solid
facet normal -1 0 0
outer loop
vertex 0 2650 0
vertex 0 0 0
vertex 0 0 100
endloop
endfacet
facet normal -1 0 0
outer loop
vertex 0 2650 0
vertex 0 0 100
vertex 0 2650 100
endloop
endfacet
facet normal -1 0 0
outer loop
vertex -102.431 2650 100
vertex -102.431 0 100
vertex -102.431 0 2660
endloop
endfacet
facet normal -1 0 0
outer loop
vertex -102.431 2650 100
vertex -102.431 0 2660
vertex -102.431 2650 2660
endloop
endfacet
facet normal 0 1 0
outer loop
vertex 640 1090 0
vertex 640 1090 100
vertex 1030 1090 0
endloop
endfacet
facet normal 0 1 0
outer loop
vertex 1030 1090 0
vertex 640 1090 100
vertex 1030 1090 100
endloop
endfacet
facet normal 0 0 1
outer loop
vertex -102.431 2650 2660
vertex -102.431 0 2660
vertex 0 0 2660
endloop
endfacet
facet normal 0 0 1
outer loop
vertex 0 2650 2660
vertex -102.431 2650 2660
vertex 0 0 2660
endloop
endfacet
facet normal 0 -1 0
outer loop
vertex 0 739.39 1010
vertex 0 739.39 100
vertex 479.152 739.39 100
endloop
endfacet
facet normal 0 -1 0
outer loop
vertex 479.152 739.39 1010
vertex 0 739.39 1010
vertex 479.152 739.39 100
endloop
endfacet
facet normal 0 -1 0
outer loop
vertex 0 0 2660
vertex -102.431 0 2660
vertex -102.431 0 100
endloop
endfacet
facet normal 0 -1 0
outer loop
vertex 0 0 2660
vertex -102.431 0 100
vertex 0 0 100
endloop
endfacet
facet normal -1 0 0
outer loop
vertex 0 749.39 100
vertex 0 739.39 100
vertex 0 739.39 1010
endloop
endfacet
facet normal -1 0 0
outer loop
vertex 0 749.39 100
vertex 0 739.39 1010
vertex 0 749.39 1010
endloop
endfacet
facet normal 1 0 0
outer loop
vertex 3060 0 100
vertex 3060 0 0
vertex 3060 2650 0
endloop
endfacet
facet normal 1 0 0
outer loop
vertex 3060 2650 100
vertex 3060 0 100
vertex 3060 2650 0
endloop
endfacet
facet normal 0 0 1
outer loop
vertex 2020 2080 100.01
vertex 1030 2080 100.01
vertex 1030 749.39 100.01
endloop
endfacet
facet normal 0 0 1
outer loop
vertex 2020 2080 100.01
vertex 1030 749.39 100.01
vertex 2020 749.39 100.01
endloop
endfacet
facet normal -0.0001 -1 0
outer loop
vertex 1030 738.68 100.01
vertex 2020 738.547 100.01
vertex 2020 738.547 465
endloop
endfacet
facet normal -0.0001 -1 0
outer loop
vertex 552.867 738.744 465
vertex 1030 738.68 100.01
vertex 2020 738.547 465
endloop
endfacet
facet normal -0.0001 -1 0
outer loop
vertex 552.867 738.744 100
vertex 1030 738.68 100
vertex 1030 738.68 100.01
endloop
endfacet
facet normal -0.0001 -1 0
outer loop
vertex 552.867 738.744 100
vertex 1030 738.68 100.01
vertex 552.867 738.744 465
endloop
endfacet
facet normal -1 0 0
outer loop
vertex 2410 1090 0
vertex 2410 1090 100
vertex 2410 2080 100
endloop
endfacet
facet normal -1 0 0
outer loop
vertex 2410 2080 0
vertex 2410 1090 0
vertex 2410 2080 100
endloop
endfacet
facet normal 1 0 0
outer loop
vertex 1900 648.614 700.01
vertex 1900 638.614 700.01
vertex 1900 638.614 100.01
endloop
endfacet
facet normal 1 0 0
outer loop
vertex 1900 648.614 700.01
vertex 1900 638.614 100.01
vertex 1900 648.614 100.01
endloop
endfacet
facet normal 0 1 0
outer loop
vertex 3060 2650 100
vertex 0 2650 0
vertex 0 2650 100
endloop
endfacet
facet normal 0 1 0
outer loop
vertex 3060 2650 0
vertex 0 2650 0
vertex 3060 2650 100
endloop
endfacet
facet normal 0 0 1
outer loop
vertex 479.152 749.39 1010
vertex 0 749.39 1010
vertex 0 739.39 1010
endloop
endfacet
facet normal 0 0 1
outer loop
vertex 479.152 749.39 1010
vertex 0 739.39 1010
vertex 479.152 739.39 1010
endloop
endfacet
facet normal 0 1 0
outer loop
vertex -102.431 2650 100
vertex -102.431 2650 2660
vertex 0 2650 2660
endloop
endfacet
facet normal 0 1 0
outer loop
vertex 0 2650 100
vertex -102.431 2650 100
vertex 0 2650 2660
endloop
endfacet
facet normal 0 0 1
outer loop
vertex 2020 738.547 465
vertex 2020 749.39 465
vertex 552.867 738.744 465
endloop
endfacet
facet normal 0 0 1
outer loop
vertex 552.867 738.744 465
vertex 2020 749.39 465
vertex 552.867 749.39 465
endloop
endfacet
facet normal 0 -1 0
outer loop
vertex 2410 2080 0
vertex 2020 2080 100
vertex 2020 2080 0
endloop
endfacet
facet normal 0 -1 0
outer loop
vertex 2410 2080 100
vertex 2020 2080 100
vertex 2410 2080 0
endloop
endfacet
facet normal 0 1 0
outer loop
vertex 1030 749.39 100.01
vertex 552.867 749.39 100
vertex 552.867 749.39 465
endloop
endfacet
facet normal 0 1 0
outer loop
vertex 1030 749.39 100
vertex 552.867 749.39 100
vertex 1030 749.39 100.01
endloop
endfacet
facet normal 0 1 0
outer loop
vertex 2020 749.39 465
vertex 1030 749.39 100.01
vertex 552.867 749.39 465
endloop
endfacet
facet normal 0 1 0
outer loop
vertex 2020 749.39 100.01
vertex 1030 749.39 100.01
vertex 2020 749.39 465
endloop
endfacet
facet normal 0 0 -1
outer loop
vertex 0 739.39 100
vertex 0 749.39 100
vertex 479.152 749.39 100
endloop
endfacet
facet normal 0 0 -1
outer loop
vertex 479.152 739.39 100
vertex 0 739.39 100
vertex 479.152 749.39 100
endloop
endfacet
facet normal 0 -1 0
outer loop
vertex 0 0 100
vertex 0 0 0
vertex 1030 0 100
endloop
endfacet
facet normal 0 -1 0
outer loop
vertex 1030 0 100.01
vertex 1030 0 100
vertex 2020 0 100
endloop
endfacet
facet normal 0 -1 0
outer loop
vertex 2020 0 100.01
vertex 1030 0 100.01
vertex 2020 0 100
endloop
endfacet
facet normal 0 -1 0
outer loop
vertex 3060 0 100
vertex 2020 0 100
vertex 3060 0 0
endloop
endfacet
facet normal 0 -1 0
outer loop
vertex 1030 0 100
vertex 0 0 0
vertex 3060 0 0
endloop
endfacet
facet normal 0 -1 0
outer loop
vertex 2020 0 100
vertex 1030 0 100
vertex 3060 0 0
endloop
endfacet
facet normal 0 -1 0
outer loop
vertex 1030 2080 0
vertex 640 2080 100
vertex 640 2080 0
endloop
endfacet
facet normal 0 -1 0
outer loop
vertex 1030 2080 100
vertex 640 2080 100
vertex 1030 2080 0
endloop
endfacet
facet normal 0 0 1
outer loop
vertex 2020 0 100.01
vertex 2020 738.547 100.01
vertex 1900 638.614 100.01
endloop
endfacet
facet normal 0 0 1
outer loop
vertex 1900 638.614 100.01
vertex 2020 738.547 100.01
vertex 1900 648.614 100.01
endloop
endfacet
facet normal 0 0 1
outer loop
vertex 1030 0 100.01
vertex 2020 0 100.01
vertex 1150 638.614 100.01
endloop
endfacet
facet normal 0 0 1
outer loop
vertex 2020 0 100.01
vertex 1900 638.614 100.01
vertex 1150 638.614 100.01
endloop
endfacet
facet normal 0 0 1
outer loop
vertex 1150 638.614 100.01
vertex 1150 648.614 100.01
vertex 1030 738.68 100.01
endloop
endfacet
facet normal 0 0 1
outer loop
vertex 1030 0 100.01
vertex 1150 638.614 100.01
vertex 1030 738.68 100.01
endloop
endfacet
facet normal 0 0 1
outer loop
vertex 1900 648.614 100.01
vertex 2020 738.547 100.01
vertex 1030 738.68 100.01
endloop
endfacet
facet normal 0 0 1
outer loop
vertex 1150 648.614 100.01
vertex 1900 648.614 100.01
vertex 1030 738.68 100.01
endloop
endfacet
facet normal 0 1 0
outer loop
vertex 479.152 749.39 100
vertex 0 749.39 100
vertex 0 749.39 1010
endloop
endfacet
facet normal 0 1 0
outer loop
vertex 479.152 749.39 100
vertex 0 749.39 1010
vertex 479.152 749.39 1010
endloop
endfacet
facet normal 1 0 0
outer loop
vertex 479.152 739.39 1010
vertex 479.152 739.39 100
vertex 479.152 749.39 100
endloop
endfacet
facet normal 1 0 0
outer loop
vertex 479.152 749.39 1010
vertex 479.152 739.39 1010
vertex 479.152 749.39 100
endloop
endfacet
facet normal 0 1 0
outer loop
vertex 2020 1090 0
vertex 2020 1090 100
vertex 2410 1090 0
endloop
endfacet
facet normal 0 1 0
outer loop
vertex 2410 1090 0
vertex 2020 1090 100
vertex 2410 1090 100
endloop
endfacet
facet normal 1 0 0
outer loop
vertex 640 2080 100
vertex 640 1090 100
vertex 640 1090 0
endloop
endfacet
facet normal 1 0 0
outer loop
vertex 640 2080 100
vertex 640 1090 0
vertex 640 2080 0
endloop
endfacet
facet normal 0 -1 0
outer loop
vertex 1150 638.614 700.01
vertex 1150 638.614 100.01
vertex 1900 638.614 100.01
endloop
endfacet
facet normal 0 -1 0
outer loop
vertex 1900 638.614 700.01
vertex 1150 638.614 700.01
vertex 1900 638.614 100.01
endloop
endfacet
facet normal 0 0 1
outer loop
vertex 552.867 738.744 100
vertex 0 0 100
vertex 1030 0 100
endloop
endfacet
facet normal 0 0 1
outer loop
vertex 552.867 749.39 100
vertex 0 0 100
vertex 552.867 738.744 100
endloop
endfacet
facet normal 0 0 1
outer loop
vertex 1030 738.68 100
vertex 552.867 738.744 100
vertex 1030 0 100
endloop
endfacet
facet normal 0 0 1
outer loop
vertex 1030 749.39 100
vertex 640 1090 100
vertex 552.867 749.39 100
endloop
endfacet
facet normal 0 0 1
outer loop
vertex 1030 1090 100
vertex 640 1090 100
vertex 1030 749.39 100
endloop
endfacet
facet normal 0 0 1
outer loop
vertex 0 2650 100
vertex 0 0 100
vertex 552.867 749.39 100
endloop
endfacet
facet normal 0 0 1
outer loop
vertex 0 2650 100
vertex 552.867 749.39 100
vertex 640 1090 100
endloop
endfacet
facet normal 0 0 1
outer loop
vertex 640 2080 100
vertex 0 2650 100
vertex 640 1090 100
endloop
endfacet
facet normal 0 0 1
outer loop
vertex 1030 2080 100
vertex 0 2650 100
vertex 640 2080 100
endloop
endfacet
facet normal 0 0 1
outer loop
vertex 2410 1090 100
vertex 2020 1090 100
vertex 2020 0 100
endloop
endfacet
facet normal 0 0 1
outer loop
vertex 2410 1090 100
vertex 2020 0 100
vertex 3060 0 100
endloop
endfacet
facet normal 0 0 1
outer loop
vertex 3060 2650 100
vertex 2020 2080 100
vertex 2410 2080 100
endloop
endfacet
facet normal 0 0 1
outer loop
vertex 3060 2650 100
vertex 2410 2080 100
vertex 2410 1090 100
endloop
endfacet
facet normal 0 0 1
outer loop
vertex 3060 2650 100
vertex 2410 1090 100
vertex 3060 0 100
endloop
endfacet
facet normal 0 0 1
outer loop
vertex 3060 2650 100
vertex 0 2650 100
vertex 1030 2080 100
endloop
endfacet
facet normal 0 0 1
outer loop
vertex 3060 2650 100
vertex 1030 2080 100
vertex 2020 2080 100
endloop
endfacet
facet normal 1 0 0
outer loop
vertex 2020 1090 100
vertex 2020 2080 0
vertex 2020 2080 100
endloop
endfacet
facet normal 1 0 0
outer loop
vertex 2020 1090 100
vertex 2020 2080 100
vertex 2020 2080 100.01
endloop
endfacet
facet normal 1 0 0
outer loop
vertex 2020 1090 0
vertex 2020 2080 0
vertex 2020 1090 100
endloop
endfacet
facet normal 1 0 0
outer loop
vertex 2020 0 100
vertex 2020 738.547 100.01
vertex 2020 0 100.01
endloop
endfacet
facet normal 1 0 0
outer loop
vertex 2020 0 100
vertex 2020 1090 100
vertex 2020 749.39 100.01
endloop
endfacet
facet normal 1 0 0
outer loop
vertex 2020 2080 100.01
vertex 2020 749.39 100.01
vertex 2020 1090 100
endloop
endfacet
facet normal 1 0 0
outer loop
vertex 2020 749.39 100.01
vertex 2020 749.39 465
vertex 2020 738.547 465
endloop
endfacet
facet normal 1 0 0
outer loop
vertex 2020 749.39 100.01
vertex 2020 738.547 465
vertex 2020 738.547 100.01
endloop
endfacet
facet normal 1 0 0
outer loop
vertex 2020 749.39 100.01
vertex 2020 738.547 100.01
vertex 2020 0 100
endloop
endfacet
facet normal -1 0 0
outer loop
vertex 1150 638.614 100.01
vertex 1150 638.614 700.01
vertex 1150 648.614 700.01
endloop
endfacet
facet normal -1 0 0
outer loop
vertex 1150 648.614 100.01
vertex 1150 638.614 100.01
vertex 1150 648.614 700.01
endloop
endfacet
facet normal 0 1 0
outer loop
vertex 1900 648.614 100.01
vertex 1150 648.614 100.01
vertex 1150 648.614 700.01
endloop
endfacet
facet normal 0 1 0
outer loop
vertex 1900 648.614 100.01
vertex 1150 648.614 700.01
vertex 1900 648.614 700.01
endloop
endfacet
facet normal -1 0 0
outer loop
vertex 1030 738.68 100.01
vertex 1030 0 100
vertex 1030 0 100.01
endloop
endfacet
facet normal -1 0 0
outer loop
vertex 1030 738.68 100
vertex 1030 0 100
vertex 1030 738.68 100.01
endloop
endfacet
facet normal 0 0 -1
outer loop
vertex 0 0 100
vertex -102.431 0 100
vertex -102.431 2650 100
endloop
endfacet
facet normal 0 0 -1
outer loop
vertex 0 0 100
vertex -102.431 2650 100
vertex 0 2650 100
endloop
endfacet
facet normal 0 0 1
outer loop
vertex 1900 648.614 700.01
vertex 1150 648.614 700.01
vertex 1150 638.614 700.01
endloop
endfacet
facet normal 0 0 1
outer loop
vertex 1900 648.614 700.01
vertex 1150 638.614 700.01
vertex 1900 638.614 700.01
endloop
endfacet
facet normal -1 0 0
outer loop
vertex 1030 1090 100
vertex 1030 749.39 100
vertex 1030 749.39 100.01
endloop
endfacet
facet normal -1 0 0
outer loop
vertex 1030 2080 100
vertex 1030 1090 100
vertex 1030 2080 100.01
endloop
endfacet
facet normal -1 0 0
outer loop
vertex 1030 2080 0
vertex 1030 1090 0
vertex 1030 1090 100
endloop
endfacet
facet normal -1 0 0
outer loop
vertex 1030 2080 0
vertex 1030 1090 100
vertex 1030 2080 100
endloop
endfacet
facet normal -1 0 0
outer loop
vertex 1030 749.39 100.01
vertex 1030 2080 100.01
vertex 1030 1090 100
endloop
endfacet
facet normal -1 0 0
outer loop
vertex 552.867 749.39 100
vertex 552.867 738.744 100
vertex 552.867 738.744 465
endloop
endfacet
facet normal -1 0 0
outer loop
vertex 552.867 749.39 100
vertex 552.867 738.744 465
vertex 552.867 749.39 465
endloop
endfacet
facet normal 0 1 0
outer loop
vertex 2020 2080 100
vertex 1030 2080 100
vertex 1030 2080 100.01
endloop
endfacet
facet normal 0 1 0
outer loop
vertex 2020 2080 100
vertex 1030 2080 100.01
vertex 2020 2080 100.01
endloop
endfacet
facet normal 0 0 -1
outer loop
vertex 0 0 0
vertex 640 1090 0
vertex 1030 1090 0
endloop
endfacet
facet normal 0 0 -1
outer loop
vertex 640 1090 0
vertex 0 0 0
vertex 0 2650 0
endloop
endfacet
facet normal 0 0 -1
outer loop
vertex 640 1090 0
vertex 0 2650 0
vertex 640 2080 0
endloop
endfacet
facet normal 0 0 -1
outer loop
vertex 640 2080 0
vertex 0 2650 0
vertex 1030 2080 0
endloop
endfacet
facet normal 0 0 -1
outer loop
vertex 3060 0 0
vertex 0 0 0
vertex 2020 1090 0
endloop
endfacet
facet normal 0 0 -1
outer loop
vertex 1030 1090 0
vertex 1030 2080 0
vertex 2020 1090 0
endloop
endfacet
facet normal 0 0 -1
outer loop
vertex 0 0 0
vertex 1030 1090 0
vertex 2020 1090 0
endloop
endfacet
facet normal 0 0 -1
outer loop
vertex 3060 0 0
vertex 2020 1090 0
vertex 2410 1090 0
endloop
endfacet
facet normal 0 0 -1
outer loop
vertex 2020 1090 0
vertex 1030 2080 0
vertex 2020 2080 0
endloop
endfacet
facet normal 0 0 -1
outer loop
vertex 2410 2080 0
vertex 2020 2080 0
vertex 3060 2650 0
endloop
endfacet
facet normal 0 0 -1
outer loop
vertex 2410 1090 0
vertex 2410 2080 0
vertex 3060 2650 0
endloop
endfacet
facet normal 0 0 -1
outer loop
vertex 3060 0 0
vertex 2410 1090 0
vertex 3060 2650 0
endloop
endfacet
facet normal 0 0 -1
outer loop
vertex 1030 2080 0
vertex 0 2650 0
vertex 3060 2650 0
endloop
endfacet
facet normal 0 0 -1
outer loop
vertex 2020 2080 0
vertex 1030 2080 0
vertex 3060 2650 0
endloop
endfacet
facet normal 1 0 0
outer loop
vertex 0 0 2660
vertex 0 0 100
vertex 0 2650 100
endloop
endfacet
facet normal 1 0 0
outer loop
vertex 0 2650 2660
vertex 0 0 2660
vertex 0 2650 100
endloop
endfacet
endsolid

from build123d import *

# Parameters (mm, degrees)
ESBO_O6_W                = 3060
ESBO_O6_H                = 2650
RESSALTO_EXTRUS_O2_DEPTH = 100
ESBO_O7_W                = 390
ESBO_O7_H                = 990
CORTE_EXTRUS_O1_DEPTH    = 749
ESBO_O8_W                = 102.431246956
ESBO_O8_H                = 2650
RESSALTO_EXTRUS_O3_DEPTH = 2560
ESBO_O9_W                = 479.151961804
ESBO_O9_H                = 10
RESSALTO_EXTRUS_O5_DEPTH = 910
RESSALTO_EXTRUS_O7_DEPTH = 365
ESBO_O13_W               = 990
ESBO_O13_H               = 1330.610148593
RESSALTO_EXTRUS_O8_DEPTH = 0.01
ESBO_O14_W               = 750
ESBO_O14_H               = 10
RESSALTO_EXTRUS_O9_DEPTH = 600


with BuildPart() as part:
    # Esboço6 → Ressalto-extrusão2 (new body)
    with BuildSketch(Plane.XY):
        with Locations((1530, 1325)):
            Rectangle(ESBO_O6_W, ESBO_O6_H)
    extrude(amount=RESSALTO_EXTRUS_O2_DEPTH)

    # Esboço7 → Corte-extrusão1 (cut)
    with BuildSketch(Plane.XY.offset(100)):
        with Locations((2215, 1585)):
            Rectangle(ESBO_O7_W, ESBO_O7_H)
        with Locations((835, 1585)):
            Rectangle(ESBO_O7_W, ESBO_O7_H)
    extrude(amount=-CORTE_EXTRUS_O1_DEPTH, mode=Mode.SUBTRACT)

    # Esboço12 → Ressalto-extrusão7 (add)
    with BuildSketch(Plane.XY.offset(100)):
        Polygon((552.866885131, 749.389851407), (2020, 749.389851407), (2020, 738.547480568), (552.866885131, 738.743736065), align=None)
    extrude(amount=RESSALTO_EXTRUS_O7_DEPTH)

    # Esboço13 → Ressalto-extrusão8 (add)
    with BuildSketch(Plane.XY.offset(100)):
        with Locations((1525, 1414.694925704)):
            Rectangle(ESBO_O13_W, ESBO_O13_H)
        Polygon((2020, 738.547480568), (2020, 0), (1030, 0), (1030, 738.679910911), align=None)
    extrude(amount=RESSALTO_EXTRUS_O8_DEPTH)

    # Esboço14 → Ressalto-extrusão9 (add)
    with BuildSketch(Plane.XY.offset(100.01)):
        with Locations((1525, 643.61369574)):
            Rectangle(ESBO_O14_W, ESBO_O14_H)
    extrude(amount=RESSALTO_EXTRUS_O9_DEPTH)


with BuildPart() as body_2:
    # Esboço8 → Ressalto-extrusão3 (new body)
    with BuildSketch(Plane.XY.offset(100)):
        with Locations((-51.215623478, 1325)):
            Rectangle(ESBO_O8_W, ESBO_O8_H)
    extrude(amount=RESSALTO_EXTRUS_O3_DEPTH)


with BuildPart() as body_3:
    # Esboço9 → Ressalto-extrusão5 (new body)
    with BuildSketch(Plane.XY.offset(100)):
        with Locations((239.575980902, 744.389851407)):
            Rectangle(ESBO_O9_W, ESBO_O9_H)
    extrude(amount=RESSALTO_EXTRUS_O5_DEPTH)


solid = Compound([part.part, body_2.part, body_3.part])
